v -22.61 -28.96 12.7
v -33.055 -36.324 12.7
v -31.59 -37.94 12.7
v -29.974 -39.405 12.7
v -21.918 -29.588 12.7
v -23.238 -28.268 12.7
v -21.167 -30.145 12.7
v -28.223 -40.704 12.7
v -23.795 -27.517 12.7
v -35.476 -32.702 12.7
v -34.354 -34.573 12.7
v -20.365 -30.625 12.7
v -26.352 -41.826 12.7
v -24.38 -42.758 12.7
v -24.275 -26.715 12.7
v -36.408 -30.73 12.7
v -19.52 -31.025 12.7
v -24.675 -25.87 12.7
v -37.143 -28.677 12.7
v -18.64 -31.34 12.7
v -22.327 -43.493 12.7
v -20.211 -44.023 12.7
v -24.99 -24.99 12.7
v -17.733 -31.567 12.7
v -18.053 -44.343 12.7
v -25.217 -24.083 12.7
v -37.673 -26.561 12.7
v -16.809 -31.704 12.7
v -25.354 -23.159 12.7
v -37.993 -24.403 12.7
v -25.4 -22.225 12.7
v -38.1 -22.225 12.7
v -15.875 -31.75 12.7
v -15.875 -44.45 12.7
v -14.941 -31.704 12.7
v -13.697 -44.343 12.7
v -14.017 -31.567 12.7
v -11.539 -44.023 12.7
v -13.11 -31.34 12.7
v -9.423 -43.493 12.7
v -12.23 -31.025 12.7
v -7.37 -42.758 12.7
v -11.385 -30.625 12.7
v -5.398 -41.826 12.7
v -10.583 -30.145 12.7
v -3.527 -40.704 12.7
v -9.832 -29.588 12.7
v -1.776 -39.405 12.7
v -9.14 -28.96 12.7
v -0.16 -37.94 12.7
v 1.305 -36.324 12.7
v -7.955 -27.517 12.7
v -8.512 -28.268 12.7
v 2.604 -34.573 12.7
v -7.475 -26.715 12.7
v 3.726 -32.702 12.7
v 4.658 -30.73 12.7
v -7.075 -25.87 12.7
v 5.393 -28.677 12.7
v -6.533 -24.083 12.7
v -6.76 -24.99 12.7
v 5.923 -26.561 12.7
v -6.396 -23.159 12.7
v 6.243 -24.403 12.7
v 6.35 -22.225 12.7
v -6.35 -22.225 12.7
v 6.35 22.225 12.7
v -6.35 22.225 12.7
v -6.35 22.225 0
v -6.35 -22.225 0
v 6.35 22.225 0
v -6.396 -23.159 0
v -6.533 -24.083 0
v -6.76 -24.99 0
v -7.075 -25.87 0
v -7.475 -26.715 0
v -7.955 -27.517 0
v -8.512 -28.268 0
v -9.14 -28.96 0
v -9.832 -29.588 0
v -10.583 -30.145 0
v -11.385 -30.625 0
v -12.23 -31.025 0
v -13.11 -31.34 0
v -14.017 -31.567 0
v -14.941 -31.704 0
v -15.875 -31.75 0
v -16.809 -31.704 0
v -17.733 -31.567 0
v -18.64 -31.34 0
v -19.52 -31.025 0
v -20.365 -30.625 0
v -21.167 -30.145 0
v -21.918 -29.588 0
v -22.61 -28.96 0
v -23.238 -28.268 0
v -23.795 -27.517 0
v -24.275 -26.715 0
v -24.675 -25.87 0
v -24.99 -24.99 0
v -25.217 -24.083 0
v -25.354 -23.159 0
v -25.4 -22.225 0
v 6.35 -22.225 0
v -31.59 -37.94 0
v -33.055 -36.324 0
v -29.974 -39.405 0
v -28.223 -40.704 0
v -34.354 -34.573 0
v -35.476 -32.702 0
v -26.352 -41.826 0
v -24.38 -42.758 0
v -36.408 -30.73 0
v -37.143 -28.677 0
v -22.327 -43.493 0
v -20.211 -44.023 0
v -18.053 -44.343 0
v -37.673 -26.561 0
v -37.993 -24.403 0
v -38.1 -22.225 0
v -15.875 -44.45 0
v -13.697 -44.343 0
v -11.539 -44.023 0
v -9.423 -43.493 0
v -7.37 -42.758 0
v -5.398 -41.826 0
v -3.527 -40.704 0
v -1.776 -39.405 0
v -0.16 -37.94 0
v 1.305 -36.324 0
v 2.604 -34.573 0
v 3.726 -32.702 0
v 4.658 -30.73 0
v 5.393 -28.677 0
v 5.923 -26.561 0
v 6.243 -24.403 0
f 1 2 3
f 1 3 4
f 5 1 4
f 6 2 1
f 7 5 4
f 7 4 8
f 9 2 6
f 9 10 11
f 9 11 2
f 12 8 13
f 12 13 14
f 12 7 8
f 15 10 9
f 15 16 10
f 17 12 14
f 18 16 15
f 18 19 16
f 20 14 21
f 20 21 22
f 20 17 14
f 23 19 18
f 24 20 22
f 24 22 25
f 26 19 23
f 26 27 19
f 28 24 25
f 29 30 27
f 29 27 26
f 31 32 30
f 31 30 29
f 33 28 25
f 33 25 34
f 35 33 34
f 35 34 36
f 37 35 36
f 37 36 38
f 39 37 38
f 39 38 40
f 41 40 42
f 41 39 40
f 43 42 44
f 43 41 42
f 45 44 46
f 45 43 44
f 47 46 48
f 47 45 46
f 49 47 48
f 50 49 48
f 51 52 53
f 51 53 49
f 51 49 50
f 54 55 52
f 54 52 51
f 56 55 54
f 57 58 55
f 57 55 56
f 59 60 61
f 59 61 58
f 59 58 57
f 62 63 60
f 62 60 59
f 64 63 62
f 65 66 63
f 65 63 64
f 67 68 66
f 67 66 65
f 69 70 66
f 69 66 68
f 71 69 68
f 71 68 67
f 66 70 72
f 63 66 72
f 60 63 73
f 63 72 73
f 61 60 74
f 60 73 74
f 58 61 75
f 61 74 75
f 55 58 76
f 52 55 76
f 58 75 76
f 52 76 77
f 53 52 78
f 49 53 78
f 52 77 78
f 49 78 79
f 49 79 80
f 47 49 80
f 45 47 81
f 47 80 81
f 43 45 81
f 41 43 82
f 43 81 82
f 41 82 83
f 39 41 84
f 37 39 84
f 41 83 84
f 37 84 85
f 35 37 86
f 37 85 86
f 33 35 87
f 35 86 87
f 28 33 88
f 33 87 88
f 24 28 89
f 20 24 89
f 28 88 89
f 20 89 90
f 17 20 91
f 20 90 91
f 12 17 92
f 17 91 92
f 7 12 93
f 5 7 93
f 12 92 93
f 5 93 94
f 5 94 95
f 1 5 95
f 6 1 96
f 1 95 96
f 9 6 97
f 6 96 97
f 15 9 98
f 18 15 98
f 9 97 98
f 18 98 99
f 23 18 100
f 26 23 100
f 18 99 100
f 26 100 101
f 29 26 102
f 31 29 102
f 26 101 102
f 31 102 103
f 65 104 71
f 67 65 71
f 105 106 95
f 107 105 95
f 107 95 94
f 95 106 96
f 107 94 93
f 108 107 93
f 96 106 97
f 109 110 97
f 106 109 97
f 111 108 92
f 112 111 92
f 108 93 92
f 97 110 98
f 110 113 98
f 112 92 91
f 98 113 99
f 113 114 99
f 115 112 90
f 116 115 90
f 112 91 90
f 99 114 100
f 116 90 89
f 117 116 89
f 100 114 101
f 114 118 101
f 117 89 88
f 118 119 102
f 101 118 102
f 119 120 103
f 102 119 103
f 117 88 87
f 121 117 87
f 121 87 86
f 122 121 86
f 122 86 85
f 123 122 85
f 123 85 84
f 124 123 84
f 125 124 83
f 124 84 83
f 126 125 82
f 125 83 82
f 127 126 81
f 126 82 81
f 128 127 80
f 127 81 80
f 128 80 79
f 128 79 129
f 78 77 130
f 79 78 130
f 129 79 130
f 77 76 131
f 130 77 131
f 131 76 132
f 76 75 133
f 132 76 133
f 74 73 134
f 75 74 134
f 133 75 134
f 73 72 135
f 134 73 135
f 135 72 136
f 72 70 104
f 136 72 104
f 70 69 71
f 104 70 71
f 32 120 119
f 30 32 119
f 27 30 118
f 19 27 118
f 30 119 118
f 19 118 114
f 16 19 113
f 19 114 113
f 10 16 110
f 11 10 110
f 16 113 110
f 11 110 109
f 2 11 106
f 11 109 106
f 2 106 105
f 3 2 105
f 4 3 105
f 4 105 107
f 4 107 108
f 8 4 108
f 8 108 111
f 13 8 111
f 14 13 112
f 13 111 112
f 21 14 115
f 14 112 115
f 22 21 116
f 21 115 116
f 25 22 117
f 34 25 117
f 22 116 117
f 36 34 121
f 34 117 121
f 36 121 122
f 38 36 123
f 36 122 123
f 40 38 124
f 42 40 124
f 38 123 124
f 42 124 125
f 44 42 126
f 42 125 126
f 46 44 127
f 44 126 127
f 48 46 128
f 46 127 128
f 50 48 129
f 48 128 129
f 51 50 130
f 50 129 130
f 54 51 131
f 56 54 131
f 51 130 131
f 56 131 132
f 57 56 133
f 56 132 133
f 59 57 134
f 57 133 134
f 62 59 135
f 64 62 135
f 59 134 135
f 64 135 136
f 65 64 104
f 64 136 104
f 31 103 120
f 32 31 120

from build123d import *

# Parameters (mm, degrees)
F0_W     = 12.7
F0_H     = 44.45
F1_DEPTH = 12.7


with BuildPart() as f1:
    # F0 (on Top) → F1 (new body)
    with BuildSketch(Plane.XY):
        Rectangle(F0_W, F0_H)
        with BuildLine():
            Line((6.35, -22.225), (-6.35, -22.225))
            ThreePointArc((-6.35, -22.225), (-15.875, -31.75), (-25.4, -22.225))
            Line((-25.4, -22.225), (-38.1, -22.225))
            ThreePointArc((-38.1, -22.225), (-15.875, -44.45), (6.35, -22.225))
        make_face()
    extrude(amount=F1_DEPTH)


solid = f1.part
